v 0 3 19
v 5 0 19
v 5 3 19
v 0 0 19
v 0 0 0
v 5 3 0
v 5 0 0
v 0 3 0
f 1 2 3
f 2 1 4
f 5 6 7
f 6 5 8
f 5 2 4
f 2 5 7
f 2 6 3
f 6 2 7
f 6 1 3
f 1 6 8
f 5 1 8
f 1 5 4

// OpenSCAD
// Generated by SolidPython 1.0.1 on 2020-07-29 00:46:54


cube(size = [5, 3, 19]);
/***********************************************
*********      SolidPython code:      **********
************************************************
 
# import packages: SolidPython
from solid import *
from solid.utils import *
from itertools import chain, combinations, permutations


class Resize:

    def __init__(self, scad_file):
        self.scad_file = scad_file
        #self.scad_file = import_scad(scad_file)
        # cone/cylinder param:
        self.r1 = 0
        self.r2 = 0
        self.h = 0
        # rectangular prism param:
        self.w = 0
        self.l = 0
        # ellipse param:
        self.r = 0

    # import OpenScad code (file name corresponds to shape)


    # classify shape + parameters
    def assign(self, param1, param2, param3):
        if self.scad_file == 'cone.scad':
            self.r1 = param1
            self.r2 = param2
            self.h = param3
        elif self.scad_file == 'cylinder.scad':
            self.r1 = param1
            self.r2 = param2
            self.h = param3
        elif self.scad_file == 'rectangularPrism.scad':
            self.h = param1
            self.l = param2
            self.w = param3
        else:
            self.r = param1
            self.h = param2

    # resize parameters
    def iterate(self):
        x = range(3, 20, 2)
        i = 1
        if self.scad_file == 'cone.scad':
            tempList = list(permutations(x, 2))
            for temp in tempList:
                param1 = temp[0]
                param2 = temp[1]
                filepath = 'produced_scad_files/' + 'cone' + str(param1) + '_' + str(param2) + '_' + '.scad'
                scad_render_to_file(cylinder(h=param1, r1=param2, r2=0), filepath)

        elif self.scad_file == 'cylinder.scad':
            tempList = list(permutations(x, 3))
            for temp in tempList:
                param1 = temp[0]
                param2 = temp[1]
                filepath = 'produced_scad_files/' + 'cylinder' + str(param1) + '_' + str(param2) + '_' + '.scad'
                scad_render_to_file(cylinder(h=param1, r1=param2, r2=param2), filepath)

        elif self.scad_file == 'rectangularPrism.scad':
            tempList = list(permutations(x, 3))
            for temp in tempList:
                param1 = temp[0]
                param2 = temp[1]
                param3 = temp[2]
                filepath = 'produced_scad_files/' + 'rectangularPrism' + str(param1) + '_' + str(param2) + '_' + str(
                    param3) + '.scad'
                scad_render_to_file(cube(size=(param1, param2, param3)), filepath)

        elif self.scad_file == 'ellipse.scad':
            tempList = list(permutations(x, 4))
            for temp in tempList:
                param1 = temp[0]
                param2 = temp[1]
                param3 = temp[2]
                param4 = temp[3]
                filepath = 'produced_scad_files/' + 'ellipse' + str(param1) + '_' + str(param2) + '_' + str(param3) + '_' + str(param4) + '.scad'
                scad_render_to_file(scale([param1, param2, param3])(sphere(r=param4)), filepath)

    def render_to_scadfile(self):
        scad_render_to_file(scad, 'example.scad') 
 
************************************************/
